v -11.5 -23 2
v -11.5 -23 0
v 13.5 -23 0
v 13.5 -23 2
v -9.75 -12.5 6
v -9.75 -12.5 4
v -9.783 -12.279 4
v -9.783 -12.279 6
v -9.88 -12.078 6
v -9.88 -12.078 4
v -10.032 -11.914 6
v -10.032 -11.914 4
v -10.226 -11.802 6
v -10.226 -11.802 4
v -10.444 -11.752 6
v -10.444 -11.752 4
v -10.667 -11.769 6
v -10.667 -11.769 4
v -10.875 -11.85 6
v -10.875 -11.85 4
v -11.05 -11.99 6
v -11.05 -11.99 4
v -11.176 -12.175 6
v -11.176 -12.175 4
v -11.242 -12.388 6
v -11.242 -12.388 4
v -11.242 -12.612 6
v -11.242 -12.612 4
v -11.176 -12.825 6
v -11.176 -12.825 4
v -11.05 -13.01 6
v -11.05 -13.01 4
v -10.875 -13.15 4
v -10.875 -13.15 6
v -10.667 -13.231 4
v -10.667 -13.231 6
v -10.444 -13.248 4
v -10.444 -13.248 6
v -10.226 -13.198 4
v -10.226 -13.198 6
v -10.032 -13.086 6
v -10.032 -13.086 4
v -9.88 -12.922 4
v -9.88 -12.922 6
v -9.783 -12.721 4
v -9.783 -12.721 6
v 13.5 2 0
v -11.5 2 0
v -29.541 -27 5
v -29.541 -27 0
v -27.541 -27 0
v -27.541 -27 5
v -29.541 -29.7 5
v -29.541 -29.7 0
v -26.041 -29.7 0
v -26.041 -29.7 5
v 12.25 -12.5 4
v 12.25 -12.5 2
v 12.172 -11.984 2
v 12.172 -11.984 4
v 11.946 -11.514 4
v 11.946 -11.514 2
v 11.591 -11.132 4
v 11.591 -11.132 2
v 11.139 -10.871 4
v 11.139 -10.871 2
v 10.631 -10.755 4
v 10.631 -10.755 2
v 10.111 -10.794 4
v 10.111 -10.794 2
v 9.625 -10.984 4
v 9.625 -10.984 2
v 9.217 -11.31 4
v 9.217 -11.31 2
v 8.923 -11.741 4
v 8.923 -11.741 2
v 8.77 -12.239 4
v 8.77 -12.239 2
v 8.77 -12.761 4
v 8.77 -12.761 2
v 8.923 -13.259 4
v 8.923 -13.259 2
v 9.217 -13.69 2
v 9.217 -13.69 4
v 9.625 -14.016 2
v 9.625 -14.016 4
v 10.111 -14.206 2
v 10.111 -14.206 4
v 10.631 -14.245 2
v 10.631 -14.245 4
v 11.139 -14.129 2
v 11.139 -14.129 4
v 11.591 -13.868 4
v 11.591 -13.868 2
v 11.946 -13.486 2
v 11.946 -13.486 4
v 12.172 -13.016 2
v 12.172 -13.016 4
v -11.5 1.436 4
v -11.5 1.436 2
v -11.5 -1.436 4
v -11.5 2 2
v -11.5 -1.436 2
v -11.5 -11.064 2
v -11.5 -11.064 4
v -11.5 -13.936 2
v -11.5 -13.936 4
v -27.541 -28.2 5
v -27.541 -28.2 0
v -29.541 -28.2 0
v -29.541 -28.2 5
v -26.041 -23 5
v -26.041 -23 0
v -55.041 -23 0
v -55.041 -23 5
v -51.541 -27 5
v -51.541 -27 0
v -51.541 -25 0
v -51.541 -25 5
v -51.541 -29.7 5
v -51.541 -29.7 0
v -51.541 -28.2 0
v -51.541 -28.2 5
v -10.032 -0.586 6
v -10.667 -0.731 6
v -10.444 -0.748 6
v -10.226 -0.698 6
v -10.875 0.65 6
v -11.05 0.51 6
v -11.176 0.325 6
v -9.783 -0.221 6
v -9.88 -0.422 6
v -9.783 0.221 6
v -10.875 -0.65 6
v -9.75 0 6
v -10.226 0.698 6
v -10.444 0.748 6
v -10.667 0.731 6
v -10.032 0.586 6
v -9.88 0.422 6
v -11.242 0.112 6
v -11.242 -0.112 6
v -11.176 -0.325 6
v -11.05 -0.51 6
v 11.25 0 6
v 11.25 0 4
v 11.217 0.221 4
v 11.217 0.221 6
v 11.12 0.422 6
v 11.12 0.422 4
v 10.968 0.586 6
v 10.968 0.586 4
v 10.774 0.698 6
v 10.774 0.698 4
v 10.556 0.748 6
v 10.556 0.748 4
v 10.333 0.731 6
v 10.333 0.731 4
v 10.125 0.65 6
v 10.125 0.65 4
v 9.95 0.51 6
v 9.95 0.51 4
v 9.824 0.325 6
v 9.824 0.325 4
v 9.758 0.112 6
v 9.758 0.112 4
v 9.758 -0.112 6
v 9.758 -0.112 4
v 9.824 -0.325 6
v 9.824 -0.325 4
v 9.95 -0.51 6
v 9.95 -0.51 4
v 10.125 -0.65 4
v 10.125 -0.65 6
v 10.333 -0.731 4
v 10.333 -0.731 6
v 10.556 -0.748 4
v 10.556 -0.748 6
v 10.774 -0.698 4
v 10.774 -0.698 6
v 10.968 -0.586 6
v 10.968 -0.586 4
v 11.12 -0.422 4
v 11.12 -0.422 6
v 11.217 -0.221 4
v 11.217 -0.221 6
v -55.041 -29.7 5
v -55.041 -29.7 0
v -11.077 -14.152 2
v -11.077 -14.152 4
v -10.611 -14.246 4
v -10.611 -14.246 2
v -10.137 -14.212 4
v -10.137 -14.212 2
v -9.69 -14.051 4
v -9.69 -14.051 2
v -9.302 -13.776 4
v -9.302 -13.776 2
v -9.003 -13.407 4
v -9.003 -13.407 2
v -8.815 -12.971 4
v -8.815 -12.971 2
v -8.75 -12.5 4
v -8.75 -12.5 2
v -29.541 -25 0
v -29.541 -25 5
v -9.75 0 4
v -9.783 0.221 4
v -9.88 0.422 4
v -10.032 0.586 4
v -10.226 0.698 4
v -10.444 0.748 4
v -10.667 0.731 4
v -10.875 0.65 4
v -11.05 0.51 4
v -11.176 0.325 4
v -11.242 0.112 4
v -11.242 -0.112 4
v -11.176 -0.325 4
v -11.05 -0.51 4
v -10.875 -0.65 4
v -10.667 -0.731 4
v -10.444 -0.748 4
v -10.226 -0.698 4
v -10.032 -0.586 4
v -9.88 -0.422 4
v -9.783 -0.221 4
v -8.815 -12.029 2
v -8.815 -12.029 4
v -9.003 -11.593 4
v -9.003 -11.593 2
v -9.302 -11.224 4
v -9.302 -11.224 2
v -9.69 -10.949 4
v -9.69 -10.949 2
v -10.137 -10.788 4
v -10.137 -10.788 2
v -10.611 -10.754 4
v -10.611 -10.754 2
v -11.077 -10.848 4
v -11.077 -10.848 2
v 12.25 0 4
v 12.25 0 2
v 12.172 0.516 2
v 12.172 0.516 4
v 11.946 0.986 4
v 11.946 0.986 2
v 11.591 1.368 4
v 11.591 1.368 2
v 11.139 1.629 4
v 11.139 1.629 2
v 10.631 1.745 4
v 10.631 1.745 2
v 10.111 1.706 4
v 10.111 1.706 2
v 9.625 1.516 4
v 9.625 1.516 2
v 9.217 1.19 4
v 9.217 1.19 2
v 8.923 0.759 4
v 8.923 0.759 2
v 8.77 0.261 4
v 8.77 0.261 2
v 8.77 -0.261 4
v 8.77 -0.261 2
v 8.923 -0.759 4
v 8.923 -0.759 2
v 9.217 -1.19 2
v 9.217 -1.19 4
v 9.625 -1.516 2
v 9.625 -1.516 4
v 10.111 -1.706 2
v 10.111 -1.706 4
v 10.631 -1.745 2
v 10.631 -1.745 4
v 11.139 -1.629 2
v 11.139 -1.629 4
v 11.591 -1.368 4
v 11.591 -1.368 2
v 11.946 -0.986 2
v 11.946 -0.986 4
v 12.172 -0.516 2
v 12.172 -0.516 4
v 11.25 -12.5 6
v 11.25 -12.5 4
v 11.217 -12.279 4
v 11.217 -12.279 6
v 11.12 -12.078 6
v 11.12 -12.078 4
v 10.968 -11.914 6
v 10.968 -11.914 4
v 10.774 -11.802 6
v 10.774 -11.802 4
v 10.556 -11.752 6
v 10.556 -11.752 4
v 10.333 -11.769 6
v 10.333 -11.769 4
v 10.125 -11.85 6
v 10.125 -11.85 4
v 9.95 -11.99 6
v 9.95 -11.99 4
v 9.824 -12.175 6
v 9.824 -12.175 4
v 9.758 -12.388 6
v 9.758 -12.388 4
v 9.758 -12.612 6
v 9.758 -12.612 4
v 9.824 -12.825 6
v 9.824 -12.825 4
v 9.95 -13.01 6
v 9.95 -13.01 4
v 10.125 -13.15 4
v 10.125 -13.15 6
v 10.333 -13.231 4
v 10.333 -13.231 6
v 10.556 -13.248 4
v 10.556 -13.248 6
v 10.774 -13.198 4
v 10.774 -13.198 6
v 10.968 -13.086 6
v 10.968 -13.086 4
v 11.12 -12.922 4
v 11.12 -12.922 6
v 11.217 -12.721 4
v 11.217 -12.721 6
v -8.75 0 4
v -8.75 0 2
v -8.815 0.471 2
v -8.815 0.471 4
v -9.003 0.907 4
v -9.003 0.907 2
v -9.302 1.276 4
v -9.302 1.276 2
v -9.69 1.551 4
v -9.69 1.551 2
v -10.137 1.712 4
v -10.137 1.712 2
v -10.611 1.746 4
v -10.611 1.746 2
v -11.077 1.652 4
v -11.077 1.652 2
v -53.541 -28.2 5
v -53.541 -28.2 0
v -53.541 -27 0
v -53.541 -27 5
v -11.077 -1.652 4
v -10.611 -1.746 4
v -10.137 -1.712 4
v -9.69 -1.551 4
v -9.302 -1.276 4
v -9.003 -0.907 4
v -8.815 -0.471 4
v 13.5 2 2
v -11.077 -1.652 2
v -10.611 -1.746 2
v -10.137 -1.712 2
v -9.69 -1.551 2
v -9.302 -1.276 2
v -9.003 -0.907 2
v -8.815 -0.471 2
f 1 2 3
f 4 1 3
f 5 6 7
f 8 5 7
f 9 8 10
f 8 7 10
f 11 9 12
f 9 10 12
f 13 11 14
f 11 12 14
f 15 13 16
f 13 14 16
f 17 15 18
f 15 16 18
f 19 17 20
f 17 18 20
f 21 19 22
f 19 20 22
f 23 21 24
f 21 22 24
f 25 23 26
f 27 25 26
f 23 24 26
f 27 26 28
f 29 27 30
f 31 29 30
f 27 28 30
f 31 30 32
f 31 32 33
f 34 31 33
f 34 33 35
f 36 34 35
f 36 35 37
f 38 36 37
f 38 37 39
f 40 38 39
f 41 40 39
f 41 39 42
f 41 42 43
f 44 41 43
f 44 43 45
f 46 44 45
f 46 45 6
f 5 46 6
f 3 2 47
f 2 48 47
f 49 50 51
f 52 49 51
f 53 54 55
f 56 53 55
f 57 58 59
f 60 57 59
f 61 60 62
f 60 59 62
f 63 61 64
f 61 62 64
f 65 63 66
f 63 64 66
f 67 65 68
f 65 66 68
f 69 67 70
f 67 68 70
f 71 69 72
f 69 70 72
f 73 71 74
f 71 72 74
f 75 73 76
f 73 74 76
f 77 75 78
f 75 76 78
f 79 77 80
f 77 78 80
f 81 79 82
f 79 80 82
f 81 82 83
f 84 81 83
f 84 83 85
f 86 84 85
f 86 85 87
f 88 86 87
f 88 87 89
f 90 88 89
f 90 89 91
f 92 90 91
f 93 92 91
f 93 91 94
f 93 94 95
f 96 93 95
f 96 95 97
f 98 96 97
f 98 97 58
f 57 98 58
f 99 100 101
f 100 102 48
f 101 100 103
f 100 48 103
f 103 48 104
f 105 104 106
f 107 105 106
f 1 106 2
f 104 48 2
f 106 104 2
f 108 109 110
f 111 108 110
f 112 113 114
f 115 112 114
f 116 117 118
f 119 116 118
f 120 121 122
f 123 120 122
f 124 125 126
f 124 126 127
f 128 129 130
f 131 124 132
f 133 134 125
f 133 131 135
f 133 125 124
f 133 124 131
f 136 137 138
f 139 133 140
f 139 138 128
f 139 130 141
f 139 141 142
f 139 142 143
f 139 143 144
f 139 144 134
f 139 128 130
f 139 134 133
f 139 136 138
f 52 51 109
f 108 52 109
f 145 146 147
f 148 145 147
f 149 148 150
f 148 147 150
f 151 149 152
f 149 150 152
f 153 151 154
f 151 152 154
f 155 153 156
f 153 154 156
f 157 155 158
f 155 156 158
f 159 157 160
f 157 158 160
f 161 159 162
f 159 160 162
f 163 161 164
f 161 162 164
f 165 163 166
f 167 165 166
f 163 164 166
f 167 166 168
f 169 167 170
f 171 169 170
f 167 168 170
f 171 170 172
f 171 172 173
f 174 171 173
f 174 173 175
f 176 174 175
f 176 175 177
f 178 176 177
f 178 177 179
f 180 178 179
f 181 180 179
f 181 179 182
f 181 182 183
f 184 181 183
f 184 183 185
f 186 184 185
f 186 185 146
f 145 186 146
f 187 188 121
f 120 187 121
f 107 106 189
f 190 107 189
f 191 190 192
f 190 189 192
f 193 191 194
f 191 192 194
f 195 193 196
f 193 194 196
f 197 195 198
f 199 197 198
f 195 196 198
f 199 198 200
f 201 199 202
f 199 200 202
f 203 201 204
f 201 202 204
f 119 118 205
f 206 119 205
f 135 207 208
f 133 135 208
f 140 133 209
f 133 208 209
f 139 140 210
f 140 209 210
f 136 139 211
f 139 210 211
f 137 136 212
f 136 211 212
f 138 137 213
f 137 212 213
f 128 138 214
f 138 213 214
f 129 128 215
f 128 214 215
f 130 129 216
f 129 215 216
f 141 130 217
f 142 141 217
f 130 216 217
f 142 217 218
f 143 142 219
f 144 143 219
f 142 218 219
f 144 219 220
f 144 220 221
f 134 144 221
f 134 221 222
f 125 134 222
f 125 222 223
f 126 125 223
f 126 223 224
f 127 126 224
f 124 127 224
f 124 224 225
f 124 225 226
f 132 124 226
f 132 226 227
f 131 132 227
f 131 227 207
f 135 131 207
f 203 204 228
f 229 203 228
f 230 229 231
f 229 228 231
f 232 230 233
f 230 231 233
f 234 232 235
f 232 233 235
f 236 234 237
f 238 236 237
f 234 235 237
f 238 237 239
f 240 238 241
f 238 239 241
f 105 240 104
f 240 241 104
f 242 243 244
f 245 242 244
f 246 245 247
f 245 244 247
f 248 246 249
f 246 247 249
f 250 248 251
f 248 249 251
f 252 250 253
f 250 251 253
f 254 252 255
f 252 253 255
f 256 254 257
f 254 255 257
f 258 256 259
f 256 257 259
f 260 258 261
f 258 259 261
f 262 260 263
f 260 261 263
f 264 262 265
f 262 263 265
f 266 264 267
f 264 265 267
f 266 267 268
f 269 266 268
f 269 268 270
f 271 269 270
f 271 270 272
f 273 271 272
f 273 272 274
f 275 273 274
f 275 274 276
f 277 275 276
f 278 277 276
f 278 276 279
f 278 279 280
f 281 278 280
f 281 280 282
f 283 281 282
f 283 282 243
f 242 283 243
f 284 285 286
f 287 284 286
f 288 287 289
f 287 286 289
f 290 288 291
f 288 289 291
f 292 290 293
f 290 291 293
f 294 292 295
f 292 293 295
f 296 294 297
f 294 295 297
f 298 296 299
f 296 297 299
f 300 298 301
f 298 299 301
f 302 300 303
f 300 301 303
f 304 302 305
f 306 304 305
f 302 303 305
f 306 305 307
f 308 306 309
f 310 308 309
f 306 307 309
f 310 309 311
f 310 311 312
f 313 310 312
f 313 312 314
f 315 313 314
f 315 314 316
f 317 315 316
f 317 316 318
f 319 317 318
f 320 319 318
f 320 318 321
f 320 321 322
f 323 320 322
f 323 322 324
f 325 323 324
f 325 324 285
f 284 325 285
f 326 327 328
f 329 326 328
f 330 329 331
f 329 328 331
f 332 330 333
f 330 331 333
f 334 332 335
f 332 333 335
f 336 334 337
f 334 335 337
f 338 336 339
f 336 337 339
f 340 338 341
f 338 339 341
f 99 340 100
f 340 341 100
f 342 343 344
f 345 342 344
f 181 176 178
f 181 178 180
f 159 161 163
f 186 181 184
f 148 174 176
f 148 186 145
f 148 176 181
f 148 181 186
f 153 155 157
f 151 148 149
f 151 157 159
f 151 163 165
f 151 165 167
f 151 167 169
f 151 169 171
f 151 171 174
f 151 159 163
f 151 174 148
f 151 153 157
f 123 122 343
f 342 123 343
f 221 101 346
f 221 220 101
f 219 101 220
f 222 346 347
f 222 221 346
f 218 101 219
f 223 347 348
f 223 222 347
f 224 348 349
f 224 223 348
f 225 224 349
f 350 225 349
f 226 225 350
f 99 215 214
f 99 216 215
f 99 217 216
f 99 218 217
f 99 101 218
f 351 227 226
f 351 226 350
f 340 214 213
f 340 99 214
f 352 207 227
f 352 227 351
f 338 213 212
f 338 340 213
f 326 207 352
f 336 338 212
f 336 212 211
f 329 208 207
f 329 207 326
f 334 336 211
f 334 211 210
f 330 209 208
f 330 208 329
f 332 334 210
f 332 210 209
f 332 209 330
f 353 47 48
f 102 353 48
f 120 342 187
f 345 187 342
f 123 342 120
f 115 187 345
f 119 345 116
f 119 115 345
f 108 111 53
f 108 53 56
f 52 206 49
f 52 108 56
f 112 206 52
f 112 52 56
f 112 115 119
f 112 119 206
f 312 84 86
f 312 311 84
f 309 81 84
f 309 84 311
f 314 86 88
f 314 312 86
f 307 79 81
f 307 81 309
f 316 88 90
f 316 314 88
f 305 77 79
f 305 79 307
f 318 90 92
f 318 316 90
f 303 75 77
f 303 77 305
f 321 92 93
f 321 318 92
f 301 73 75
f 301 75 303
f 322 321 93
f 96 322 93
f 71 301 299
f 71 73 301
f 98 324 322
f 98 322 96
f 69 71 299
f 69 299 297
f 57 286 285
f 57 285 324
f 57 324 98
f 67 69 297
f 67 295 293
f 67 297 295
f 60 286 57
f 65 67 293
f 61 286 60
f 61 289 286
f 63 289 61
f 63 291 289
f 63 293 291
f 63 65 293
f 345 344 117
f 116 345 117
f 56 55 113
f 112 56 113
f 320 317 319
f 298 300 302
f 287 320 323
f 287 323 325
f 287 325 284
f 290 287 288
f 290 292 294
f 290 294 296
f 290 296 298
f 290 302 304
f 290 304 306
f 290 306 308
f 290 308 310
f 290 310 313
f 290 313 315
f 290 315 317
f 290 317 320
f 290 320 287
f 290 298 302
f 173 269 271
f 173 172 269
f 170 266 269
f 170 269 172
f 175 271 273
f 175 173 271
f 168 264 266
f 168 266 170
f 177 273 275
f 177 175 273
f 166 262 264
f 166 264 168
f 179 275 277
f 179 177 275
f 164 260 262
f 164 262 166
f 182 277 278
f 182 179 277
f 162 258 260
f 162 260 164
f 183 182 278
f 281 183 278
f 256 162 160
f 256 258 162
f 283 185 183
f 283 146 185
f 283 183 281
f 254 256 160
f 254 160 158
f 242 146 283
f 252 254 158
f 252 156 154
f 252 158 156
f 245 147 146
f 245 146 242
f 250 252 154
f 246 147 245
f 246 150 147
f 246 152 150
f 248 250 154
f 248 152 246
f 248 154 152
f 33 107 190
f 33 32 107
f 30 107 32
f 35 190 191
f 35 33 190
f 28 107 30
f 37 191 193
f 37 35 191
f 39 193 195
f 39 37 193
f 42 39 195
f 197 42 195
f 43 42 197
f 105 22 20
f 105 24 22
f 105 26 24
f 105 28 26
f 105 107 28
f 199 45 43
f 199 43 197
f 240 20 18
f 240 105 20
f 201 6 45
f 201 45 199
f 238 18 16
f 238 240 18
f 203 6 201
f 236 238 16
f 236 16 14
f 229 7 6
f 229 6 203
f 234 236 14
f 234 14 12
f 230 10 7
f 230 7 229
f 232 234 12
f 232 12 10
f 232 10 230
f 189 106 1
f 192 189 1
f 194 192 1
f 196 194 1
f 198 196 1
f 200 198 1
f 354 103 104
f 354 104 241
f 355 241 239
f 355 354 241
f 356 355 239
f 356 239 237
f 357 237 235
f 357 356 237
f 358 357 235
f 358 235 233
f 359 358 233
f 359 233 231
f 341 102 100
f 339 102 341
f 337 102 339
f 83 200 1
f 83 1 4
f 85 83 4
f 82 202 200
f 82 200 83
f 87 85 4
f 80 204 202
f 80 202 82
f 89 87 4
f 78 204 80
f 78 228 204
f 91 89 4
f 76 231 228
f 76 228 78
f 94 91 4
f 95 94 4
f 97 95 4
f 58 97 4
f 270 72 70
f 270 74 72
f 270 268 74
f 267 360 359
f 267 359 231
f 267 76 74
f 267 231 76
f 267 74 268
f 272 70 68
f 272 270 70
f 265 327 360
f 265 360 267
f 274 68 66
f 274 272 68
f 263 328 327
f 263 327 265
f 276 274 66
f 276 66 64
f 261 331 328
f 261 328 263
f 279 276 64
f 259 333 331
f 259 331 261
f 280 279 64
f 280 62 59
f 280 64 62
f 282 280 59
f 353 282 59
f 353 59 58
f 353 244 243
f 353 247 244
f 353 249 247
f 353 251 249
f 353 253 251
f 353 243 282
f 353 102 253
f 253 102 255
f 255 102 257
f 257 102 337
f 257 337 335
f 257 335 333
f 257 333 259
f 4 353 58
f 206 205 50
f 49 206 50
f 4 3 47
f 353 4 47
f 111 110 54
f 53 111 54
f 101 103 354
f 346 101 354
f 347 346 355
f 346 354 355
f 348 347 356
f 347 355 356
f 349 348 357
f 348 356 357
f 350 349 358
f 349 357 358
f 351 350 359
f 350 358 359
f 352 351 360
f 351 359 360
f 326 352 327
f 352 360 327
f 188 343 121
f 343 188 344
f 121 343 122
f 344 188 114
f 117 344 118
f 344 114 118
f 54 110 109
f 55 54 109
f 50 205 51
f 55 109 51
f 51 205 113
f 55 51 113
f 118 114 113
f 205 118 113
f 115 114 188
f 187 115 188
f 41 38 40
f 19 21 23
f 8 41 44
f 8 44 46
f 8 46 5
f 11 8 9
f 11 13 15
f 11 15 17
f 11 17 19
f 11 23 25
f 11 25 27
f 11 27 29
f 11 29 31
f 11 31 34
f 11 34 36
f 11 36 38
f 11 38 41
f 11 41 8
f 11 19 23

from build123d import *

# Parameters (mm, degrees)
F0_R     = 1.75
F1_DEPTH = 2
F0_R_2   = 0.75
F2_DEPTH = 4
F3_DEPTH = 6
F4_DEPTH = 5


with BuildPart() as f1:
    # F0 (on Top) → F1 (new body)
    with BuildSketch(Plane.XY):
        with BuildLine():
            Line((13.5, 2), (-11.5, 2))
            Line((-11.5, 2), (-11.5, 1.436141))
            ThreePointArc((-11.5, 1.436141), (-9.689907, 1.551209), (-8.75, 0))
            ThreePointArc((-8.75, 0), (-9.689907, -1.551209), (-11.5, -1.436141))
            Line((-11.5, -1.436141), (-11.5, -11.063859))
            ThreePointArc((-11.5, -11.063859), (-9.689907, -10.948791), (-8.75, -12.5))
            ThreePointArc((-8.75, -12.5), (-9.689907, -14.051209), (-11.5, -13.936141))
            Line((-11.5, -13.936141), (-11.5, -23))
            Line((-11.5, -23), (13.5, -23))
            Line((13.5, -23), (13.5, 2))
        make_face()
        with Locations((10.5, -12.5)):
            Circle(F0_R, mode=Mode.SUBTRACT)
        with Locations((10.5, 0)):
            Circle(F0_R, mode=Mode.SUBTRACT)
    extrude(amount=F1_DEPTH)

    # F0 (on Top) → F2 (join)
    with BuildSketch(Plane.XY):
        with BuildLine():
            ThreePointArc((-8.75, 0), (-9.689907, 1.551209), (-11.5, 1.436141))
            Line((-11.5, 1.436141), (-11.5, -1.436141))
            ThreePointArc((-11.5, -1.436141), (-9.689907, -1.551209), (-8.75, 0))
        make_face()
        with Locations((-10.5, 0)):
            Circle(F0_R_2, mode=Mode.SUBTRACT)
        with Locations((10.5, 0)):
            Circle(F0_R)
        with Locations((10.5, 0)):
            Circle(F0_R_2, mode=Mode.SUBTRACT)
        with Locations((10.5, -12.5)):
            Circle(F0_R)
        with Locations((10.5, -12.5)):
            Circle(F0_R_2, mode=Mode.SUBTRACT)
        with BuildLine():
            ThreePointArc((-8.75, -12.5), (-9.689907, -10.948791), (-11.5, -11.063859))
            Line((-11.5, -11.063859), (-11.5, -13.936141))
            ThreePointArc((-11.5, -13.936141), (-9.689907, -14.051209), (-8.75, -12.5))
        make_face()
        with Locations((-10.5, -12.5)):
            Circle(F0_R_2, mode=Mode.SUBTRACT)
    extrude(amount=F2_DEPTH)

    # F0 (on Top) → F3 (join)
    with BuildSketch(Plane.XY):
        with Locations((-10.5, 0)):
            Circle(F0_R_2)
        with Locations((10.5, 0)):
            Circle(F0_R_2)
        with Locations((10.5, -12.5)):
            Circle(F0_R_2)
        with Locations((-10.5, -12.5)):
            Circle(F0_R_2)
    extrude(amount=F3_DEPTH)


with BuildPart() as f4:
    # F0 (on Top) → F4 (new body)
    with BuildSketch(Plane.XY):
        Polygon((-26.040516, -23), (-40.540516, -23), (-55.040516, -23), (-55.040516, -29.7), (-51.540516, -29.7), (-51.540516, -28.2), (-53.540516, -28.2), (-53.540516, -27), (-51.540516, -27), (-51.540516, -25), (-40.540516, -25), (-29.540516, -25), (-29.540516, -27), (-27.540516, -27), (-27.540516, -28.2), (-29.540516, -28.2), (-29.540516, -29.7), (-26.040516, -29.7), align=None)
    extrude(amount=F4_DEPTH)


solid = Compound([f1.part, f4.part])
